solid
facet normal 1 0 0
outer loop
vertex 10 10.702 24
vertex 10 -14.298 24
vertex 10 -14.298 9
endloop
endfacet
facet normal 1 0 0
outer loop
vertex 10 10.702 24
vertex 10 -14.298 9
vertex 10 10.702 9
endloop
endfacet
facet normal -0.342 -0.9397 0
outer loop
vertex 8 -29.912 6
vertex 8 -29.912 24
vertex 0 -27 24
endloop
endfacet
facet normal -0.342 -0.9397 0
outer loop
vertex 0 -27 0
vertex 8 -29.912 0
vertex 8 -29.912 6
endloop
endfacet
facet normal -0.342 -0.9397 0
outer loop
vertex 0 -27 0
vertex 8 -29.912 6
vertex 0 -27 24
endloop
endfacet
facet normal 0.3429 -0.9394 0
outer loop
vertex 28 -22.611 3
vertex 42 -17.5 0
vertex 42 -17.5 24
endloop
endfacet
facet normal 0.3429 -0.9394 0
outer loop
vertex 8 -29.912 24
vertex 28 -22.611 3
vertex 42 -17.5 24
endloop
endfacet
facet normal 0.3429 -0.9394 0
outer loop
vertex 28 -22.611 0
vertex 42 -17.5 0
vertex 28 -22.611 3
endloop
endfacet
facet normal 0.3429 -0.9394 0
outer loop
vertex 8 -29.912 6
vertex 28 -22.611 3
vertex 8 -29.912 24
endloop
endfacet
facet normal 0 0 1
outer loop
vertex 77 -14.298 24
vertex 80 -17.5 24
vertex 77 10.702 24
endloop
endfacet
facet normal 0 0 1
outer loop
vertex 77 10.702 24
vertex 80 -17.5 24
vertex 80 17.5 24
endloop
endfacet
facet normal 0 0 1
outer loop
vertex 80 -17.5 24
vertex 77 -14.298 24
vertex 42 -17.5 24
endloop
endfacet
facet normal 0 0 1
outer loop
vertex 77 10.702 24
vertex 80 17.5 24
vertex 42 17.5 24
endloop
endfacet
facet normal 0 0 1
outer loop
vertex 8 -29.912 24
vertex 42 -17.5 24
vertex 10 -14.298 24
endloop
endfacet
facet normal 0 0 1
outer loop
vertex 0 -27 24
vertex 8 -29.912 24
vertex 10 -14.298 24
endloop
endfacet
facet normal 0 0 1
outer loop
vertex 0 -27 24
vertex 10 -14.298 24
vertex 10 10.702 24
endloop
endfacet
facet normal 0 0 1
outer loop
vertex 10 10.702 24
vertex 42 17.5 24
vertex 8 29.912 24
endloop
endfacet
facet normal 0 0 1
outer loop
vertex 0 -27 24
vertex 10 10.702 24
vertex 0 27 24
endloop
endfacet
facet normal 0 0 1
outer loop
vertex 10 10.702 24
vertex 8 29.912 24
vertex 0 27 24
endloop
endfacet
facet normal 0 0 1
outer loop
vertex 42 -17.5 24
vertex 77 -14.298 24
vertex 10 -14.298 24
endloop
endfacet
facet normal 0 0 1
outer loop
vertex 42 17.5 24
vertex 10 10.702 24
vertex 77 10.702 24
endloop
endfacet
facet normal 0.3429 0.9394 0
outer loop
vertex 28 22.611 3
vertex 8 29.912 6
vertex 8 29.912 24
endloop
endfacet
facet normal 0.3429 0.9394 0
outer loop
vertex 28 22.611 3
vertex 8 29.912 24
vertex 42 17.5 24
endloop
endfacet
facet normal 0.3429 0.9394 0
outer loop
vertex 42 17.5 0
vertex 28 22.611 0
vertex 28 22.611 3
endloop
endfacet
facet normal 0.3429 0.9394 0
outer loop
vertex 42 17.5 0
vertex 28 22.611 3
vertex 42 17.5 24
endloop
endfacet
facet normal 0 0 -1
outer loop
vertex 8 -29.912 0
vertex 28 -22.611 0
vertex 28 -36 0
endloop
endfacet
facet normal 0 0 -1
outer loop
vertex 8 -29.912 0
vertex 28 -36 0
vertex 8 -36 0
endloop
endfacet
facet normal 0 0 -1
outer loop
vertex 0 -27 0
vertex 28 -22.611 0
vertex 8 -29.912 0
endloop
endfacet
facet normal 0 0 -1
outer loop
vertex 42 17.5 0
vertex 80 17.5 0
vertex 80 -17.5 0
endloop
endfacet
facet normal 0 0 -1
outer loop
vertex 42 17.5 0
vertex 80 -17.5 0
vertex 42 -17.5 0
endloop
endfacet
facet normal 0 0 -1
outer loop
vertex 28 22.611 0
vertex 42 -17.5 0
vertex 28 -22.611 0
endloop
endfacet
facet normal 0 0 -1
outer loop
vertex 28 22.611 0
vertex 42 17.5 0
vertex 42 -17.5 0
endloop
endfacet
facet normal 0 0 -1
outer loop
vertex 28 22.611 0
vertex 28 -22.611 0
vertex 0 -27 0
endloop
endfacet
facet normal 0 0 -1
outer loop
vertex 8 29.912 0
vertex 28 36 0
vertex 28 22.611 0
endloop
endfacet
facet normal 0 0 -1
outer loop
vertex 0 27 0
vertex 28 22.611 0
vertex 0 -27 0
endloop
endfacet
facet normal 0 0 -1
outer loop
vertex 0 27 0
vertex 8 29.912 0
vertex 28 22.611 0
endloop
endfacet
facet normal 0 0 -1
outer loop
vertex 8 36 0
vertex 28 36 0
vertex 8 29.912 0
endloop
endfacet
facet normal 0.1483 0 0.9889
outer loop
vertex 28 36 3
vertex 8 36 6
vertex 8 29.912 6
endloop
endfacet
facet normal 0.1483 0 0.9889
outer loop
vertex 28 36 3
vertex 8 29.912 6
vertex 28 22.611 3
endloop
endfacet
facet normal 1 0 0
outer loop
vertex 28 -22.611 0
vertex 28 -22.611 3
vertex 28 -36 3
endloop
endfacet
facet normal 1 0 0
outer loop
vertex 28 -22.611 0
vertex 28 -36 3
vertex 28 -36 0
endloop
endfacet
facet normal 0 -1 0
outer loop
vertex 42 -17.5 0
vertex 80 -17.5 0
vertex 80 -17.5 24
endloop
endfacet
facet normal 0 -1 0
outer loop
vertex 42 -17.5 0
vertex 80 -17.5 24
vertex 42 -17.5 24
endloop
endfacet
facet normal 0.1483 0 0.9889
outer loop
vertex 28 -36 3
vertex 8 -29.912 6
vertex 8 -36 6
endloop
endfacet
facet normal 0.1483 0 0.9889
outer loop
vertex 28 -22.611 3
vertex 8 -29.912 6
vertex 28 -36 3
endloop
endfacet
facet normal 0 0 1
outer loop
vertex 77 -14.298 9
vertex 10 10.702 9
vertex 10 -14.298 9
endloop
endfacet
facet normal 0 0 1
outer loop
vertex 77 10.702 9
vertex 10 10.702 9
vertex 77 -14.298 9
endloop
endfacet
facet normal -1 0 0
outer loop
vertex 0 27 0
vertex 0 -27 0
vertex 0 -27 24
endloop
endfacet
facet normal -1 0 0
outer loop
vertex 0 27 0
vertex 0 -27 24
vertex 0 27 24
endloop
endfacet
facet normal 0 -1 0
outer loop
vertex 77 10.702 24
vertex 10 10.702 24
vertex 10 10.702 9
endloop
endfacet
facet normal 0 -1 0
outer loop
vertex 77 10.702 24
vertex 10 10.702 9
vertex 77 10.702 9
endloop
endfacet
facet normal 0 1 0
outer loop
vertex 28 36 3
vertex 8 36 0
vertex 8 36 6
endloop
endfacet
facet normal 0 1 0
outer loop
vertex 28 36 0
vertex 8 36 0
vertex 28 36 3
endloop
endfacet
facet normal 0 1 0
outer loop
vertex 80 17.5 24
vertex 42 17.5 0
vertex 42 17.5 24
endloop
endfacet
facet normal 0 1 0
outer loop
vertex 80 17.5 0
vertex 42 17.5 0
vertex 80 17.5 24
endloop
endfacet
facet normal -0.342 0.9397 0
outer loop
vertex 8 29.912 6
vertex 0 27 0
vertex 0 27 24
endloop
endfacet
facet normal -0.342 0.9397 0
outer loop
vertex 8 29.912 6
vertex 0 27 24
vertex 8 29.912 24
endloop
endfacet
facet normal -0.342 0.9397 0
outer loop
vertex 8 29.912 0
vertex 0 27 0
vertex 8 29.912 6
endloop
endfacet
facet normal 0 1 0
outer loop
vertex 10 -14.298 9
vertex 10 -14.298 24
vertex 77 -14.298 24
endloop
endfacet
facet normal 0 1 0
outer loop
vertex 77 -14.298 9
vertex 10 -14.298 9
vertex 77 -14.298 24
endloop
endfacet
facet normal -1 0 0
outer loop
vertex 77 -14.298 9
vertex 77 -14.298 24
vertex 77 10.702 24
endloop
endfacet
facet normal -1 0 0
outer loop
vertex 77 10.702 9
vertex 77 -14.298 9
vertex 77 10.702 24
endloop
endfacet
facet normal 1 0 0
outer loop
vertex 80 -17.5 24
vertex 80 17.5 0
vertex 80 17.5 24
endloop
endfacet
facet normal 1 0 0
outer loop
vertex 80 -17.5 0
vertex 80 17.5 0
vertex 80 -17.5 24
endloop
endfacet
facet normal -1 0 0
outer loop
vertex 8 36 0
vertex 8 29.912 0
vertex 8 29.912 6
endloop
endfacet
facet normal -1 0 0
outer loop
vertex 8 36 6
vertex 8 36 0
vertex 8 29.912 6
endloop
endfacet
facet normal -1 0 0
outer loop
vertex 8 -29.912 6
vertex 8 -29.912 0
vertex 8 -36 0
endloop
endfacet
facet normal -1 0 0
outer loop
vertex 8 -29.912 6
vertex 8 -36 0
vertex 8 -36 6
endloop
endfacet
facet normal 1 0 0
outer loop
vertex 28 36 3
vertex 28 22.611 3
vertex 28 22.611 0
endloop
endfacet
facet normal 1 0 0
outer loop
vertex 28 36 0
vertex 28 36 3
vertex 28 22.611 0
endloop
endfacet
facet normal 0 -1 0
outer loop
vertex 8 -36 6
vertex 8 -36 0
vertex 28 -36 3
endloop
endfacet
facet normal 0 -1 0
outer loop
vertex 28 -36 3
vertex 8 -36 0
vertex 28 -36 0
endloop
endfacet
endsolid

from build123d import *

# Parameters (mm, degrees)
BOSS_EXTRUDE1_DEPTH = 24
BOSS_EXTRUDE2_DEPTH = 36
SKETCH3_W           = 67
SKETCH3_H           = 25
CUT_EXTRUDE2_DEPTH  = 15


with BuildPart() as part:
    # Sketch1 → Boss-Extrude1 (new body)
    with BuildSketch(Plane.XY):
        Polygon((0, -27), (0, 27), (8, 29.911761874), (42, 17.5), (80, 17.5), (80, -17.5), (42, -17.5), (8, -29.911761874), align=None)
    extrude(amount=BOSS_EXTRUDE1_DEPTH)

    # Sketch2 → Boss-Extrude2 (add, symmetric)
    with BuildSketch(Plane(origin=(0, 0, 0), x_dir=(1, 0, 0), z_dir=(0, 1, 0))):
        Polygon((8, 0), (8, -6), (28, -3), (28, 0), align=None)
    extrude(amount=BOSS_EXTRUDE2_DEPTH, both=True)

    # Sketch3 → Cut-Extrude2 (cut)
    with BuildSketch(Plane.XY.offset(24)):
        with Locations((43.5, -1.797832718)):
            Rectangle(SKETCH3_W, SKETCH3_H)
    extrude(amount=-CUT_EXTRUDE2_DEPTH, mode=Mode.SUBTRACT)


solid = part.part
